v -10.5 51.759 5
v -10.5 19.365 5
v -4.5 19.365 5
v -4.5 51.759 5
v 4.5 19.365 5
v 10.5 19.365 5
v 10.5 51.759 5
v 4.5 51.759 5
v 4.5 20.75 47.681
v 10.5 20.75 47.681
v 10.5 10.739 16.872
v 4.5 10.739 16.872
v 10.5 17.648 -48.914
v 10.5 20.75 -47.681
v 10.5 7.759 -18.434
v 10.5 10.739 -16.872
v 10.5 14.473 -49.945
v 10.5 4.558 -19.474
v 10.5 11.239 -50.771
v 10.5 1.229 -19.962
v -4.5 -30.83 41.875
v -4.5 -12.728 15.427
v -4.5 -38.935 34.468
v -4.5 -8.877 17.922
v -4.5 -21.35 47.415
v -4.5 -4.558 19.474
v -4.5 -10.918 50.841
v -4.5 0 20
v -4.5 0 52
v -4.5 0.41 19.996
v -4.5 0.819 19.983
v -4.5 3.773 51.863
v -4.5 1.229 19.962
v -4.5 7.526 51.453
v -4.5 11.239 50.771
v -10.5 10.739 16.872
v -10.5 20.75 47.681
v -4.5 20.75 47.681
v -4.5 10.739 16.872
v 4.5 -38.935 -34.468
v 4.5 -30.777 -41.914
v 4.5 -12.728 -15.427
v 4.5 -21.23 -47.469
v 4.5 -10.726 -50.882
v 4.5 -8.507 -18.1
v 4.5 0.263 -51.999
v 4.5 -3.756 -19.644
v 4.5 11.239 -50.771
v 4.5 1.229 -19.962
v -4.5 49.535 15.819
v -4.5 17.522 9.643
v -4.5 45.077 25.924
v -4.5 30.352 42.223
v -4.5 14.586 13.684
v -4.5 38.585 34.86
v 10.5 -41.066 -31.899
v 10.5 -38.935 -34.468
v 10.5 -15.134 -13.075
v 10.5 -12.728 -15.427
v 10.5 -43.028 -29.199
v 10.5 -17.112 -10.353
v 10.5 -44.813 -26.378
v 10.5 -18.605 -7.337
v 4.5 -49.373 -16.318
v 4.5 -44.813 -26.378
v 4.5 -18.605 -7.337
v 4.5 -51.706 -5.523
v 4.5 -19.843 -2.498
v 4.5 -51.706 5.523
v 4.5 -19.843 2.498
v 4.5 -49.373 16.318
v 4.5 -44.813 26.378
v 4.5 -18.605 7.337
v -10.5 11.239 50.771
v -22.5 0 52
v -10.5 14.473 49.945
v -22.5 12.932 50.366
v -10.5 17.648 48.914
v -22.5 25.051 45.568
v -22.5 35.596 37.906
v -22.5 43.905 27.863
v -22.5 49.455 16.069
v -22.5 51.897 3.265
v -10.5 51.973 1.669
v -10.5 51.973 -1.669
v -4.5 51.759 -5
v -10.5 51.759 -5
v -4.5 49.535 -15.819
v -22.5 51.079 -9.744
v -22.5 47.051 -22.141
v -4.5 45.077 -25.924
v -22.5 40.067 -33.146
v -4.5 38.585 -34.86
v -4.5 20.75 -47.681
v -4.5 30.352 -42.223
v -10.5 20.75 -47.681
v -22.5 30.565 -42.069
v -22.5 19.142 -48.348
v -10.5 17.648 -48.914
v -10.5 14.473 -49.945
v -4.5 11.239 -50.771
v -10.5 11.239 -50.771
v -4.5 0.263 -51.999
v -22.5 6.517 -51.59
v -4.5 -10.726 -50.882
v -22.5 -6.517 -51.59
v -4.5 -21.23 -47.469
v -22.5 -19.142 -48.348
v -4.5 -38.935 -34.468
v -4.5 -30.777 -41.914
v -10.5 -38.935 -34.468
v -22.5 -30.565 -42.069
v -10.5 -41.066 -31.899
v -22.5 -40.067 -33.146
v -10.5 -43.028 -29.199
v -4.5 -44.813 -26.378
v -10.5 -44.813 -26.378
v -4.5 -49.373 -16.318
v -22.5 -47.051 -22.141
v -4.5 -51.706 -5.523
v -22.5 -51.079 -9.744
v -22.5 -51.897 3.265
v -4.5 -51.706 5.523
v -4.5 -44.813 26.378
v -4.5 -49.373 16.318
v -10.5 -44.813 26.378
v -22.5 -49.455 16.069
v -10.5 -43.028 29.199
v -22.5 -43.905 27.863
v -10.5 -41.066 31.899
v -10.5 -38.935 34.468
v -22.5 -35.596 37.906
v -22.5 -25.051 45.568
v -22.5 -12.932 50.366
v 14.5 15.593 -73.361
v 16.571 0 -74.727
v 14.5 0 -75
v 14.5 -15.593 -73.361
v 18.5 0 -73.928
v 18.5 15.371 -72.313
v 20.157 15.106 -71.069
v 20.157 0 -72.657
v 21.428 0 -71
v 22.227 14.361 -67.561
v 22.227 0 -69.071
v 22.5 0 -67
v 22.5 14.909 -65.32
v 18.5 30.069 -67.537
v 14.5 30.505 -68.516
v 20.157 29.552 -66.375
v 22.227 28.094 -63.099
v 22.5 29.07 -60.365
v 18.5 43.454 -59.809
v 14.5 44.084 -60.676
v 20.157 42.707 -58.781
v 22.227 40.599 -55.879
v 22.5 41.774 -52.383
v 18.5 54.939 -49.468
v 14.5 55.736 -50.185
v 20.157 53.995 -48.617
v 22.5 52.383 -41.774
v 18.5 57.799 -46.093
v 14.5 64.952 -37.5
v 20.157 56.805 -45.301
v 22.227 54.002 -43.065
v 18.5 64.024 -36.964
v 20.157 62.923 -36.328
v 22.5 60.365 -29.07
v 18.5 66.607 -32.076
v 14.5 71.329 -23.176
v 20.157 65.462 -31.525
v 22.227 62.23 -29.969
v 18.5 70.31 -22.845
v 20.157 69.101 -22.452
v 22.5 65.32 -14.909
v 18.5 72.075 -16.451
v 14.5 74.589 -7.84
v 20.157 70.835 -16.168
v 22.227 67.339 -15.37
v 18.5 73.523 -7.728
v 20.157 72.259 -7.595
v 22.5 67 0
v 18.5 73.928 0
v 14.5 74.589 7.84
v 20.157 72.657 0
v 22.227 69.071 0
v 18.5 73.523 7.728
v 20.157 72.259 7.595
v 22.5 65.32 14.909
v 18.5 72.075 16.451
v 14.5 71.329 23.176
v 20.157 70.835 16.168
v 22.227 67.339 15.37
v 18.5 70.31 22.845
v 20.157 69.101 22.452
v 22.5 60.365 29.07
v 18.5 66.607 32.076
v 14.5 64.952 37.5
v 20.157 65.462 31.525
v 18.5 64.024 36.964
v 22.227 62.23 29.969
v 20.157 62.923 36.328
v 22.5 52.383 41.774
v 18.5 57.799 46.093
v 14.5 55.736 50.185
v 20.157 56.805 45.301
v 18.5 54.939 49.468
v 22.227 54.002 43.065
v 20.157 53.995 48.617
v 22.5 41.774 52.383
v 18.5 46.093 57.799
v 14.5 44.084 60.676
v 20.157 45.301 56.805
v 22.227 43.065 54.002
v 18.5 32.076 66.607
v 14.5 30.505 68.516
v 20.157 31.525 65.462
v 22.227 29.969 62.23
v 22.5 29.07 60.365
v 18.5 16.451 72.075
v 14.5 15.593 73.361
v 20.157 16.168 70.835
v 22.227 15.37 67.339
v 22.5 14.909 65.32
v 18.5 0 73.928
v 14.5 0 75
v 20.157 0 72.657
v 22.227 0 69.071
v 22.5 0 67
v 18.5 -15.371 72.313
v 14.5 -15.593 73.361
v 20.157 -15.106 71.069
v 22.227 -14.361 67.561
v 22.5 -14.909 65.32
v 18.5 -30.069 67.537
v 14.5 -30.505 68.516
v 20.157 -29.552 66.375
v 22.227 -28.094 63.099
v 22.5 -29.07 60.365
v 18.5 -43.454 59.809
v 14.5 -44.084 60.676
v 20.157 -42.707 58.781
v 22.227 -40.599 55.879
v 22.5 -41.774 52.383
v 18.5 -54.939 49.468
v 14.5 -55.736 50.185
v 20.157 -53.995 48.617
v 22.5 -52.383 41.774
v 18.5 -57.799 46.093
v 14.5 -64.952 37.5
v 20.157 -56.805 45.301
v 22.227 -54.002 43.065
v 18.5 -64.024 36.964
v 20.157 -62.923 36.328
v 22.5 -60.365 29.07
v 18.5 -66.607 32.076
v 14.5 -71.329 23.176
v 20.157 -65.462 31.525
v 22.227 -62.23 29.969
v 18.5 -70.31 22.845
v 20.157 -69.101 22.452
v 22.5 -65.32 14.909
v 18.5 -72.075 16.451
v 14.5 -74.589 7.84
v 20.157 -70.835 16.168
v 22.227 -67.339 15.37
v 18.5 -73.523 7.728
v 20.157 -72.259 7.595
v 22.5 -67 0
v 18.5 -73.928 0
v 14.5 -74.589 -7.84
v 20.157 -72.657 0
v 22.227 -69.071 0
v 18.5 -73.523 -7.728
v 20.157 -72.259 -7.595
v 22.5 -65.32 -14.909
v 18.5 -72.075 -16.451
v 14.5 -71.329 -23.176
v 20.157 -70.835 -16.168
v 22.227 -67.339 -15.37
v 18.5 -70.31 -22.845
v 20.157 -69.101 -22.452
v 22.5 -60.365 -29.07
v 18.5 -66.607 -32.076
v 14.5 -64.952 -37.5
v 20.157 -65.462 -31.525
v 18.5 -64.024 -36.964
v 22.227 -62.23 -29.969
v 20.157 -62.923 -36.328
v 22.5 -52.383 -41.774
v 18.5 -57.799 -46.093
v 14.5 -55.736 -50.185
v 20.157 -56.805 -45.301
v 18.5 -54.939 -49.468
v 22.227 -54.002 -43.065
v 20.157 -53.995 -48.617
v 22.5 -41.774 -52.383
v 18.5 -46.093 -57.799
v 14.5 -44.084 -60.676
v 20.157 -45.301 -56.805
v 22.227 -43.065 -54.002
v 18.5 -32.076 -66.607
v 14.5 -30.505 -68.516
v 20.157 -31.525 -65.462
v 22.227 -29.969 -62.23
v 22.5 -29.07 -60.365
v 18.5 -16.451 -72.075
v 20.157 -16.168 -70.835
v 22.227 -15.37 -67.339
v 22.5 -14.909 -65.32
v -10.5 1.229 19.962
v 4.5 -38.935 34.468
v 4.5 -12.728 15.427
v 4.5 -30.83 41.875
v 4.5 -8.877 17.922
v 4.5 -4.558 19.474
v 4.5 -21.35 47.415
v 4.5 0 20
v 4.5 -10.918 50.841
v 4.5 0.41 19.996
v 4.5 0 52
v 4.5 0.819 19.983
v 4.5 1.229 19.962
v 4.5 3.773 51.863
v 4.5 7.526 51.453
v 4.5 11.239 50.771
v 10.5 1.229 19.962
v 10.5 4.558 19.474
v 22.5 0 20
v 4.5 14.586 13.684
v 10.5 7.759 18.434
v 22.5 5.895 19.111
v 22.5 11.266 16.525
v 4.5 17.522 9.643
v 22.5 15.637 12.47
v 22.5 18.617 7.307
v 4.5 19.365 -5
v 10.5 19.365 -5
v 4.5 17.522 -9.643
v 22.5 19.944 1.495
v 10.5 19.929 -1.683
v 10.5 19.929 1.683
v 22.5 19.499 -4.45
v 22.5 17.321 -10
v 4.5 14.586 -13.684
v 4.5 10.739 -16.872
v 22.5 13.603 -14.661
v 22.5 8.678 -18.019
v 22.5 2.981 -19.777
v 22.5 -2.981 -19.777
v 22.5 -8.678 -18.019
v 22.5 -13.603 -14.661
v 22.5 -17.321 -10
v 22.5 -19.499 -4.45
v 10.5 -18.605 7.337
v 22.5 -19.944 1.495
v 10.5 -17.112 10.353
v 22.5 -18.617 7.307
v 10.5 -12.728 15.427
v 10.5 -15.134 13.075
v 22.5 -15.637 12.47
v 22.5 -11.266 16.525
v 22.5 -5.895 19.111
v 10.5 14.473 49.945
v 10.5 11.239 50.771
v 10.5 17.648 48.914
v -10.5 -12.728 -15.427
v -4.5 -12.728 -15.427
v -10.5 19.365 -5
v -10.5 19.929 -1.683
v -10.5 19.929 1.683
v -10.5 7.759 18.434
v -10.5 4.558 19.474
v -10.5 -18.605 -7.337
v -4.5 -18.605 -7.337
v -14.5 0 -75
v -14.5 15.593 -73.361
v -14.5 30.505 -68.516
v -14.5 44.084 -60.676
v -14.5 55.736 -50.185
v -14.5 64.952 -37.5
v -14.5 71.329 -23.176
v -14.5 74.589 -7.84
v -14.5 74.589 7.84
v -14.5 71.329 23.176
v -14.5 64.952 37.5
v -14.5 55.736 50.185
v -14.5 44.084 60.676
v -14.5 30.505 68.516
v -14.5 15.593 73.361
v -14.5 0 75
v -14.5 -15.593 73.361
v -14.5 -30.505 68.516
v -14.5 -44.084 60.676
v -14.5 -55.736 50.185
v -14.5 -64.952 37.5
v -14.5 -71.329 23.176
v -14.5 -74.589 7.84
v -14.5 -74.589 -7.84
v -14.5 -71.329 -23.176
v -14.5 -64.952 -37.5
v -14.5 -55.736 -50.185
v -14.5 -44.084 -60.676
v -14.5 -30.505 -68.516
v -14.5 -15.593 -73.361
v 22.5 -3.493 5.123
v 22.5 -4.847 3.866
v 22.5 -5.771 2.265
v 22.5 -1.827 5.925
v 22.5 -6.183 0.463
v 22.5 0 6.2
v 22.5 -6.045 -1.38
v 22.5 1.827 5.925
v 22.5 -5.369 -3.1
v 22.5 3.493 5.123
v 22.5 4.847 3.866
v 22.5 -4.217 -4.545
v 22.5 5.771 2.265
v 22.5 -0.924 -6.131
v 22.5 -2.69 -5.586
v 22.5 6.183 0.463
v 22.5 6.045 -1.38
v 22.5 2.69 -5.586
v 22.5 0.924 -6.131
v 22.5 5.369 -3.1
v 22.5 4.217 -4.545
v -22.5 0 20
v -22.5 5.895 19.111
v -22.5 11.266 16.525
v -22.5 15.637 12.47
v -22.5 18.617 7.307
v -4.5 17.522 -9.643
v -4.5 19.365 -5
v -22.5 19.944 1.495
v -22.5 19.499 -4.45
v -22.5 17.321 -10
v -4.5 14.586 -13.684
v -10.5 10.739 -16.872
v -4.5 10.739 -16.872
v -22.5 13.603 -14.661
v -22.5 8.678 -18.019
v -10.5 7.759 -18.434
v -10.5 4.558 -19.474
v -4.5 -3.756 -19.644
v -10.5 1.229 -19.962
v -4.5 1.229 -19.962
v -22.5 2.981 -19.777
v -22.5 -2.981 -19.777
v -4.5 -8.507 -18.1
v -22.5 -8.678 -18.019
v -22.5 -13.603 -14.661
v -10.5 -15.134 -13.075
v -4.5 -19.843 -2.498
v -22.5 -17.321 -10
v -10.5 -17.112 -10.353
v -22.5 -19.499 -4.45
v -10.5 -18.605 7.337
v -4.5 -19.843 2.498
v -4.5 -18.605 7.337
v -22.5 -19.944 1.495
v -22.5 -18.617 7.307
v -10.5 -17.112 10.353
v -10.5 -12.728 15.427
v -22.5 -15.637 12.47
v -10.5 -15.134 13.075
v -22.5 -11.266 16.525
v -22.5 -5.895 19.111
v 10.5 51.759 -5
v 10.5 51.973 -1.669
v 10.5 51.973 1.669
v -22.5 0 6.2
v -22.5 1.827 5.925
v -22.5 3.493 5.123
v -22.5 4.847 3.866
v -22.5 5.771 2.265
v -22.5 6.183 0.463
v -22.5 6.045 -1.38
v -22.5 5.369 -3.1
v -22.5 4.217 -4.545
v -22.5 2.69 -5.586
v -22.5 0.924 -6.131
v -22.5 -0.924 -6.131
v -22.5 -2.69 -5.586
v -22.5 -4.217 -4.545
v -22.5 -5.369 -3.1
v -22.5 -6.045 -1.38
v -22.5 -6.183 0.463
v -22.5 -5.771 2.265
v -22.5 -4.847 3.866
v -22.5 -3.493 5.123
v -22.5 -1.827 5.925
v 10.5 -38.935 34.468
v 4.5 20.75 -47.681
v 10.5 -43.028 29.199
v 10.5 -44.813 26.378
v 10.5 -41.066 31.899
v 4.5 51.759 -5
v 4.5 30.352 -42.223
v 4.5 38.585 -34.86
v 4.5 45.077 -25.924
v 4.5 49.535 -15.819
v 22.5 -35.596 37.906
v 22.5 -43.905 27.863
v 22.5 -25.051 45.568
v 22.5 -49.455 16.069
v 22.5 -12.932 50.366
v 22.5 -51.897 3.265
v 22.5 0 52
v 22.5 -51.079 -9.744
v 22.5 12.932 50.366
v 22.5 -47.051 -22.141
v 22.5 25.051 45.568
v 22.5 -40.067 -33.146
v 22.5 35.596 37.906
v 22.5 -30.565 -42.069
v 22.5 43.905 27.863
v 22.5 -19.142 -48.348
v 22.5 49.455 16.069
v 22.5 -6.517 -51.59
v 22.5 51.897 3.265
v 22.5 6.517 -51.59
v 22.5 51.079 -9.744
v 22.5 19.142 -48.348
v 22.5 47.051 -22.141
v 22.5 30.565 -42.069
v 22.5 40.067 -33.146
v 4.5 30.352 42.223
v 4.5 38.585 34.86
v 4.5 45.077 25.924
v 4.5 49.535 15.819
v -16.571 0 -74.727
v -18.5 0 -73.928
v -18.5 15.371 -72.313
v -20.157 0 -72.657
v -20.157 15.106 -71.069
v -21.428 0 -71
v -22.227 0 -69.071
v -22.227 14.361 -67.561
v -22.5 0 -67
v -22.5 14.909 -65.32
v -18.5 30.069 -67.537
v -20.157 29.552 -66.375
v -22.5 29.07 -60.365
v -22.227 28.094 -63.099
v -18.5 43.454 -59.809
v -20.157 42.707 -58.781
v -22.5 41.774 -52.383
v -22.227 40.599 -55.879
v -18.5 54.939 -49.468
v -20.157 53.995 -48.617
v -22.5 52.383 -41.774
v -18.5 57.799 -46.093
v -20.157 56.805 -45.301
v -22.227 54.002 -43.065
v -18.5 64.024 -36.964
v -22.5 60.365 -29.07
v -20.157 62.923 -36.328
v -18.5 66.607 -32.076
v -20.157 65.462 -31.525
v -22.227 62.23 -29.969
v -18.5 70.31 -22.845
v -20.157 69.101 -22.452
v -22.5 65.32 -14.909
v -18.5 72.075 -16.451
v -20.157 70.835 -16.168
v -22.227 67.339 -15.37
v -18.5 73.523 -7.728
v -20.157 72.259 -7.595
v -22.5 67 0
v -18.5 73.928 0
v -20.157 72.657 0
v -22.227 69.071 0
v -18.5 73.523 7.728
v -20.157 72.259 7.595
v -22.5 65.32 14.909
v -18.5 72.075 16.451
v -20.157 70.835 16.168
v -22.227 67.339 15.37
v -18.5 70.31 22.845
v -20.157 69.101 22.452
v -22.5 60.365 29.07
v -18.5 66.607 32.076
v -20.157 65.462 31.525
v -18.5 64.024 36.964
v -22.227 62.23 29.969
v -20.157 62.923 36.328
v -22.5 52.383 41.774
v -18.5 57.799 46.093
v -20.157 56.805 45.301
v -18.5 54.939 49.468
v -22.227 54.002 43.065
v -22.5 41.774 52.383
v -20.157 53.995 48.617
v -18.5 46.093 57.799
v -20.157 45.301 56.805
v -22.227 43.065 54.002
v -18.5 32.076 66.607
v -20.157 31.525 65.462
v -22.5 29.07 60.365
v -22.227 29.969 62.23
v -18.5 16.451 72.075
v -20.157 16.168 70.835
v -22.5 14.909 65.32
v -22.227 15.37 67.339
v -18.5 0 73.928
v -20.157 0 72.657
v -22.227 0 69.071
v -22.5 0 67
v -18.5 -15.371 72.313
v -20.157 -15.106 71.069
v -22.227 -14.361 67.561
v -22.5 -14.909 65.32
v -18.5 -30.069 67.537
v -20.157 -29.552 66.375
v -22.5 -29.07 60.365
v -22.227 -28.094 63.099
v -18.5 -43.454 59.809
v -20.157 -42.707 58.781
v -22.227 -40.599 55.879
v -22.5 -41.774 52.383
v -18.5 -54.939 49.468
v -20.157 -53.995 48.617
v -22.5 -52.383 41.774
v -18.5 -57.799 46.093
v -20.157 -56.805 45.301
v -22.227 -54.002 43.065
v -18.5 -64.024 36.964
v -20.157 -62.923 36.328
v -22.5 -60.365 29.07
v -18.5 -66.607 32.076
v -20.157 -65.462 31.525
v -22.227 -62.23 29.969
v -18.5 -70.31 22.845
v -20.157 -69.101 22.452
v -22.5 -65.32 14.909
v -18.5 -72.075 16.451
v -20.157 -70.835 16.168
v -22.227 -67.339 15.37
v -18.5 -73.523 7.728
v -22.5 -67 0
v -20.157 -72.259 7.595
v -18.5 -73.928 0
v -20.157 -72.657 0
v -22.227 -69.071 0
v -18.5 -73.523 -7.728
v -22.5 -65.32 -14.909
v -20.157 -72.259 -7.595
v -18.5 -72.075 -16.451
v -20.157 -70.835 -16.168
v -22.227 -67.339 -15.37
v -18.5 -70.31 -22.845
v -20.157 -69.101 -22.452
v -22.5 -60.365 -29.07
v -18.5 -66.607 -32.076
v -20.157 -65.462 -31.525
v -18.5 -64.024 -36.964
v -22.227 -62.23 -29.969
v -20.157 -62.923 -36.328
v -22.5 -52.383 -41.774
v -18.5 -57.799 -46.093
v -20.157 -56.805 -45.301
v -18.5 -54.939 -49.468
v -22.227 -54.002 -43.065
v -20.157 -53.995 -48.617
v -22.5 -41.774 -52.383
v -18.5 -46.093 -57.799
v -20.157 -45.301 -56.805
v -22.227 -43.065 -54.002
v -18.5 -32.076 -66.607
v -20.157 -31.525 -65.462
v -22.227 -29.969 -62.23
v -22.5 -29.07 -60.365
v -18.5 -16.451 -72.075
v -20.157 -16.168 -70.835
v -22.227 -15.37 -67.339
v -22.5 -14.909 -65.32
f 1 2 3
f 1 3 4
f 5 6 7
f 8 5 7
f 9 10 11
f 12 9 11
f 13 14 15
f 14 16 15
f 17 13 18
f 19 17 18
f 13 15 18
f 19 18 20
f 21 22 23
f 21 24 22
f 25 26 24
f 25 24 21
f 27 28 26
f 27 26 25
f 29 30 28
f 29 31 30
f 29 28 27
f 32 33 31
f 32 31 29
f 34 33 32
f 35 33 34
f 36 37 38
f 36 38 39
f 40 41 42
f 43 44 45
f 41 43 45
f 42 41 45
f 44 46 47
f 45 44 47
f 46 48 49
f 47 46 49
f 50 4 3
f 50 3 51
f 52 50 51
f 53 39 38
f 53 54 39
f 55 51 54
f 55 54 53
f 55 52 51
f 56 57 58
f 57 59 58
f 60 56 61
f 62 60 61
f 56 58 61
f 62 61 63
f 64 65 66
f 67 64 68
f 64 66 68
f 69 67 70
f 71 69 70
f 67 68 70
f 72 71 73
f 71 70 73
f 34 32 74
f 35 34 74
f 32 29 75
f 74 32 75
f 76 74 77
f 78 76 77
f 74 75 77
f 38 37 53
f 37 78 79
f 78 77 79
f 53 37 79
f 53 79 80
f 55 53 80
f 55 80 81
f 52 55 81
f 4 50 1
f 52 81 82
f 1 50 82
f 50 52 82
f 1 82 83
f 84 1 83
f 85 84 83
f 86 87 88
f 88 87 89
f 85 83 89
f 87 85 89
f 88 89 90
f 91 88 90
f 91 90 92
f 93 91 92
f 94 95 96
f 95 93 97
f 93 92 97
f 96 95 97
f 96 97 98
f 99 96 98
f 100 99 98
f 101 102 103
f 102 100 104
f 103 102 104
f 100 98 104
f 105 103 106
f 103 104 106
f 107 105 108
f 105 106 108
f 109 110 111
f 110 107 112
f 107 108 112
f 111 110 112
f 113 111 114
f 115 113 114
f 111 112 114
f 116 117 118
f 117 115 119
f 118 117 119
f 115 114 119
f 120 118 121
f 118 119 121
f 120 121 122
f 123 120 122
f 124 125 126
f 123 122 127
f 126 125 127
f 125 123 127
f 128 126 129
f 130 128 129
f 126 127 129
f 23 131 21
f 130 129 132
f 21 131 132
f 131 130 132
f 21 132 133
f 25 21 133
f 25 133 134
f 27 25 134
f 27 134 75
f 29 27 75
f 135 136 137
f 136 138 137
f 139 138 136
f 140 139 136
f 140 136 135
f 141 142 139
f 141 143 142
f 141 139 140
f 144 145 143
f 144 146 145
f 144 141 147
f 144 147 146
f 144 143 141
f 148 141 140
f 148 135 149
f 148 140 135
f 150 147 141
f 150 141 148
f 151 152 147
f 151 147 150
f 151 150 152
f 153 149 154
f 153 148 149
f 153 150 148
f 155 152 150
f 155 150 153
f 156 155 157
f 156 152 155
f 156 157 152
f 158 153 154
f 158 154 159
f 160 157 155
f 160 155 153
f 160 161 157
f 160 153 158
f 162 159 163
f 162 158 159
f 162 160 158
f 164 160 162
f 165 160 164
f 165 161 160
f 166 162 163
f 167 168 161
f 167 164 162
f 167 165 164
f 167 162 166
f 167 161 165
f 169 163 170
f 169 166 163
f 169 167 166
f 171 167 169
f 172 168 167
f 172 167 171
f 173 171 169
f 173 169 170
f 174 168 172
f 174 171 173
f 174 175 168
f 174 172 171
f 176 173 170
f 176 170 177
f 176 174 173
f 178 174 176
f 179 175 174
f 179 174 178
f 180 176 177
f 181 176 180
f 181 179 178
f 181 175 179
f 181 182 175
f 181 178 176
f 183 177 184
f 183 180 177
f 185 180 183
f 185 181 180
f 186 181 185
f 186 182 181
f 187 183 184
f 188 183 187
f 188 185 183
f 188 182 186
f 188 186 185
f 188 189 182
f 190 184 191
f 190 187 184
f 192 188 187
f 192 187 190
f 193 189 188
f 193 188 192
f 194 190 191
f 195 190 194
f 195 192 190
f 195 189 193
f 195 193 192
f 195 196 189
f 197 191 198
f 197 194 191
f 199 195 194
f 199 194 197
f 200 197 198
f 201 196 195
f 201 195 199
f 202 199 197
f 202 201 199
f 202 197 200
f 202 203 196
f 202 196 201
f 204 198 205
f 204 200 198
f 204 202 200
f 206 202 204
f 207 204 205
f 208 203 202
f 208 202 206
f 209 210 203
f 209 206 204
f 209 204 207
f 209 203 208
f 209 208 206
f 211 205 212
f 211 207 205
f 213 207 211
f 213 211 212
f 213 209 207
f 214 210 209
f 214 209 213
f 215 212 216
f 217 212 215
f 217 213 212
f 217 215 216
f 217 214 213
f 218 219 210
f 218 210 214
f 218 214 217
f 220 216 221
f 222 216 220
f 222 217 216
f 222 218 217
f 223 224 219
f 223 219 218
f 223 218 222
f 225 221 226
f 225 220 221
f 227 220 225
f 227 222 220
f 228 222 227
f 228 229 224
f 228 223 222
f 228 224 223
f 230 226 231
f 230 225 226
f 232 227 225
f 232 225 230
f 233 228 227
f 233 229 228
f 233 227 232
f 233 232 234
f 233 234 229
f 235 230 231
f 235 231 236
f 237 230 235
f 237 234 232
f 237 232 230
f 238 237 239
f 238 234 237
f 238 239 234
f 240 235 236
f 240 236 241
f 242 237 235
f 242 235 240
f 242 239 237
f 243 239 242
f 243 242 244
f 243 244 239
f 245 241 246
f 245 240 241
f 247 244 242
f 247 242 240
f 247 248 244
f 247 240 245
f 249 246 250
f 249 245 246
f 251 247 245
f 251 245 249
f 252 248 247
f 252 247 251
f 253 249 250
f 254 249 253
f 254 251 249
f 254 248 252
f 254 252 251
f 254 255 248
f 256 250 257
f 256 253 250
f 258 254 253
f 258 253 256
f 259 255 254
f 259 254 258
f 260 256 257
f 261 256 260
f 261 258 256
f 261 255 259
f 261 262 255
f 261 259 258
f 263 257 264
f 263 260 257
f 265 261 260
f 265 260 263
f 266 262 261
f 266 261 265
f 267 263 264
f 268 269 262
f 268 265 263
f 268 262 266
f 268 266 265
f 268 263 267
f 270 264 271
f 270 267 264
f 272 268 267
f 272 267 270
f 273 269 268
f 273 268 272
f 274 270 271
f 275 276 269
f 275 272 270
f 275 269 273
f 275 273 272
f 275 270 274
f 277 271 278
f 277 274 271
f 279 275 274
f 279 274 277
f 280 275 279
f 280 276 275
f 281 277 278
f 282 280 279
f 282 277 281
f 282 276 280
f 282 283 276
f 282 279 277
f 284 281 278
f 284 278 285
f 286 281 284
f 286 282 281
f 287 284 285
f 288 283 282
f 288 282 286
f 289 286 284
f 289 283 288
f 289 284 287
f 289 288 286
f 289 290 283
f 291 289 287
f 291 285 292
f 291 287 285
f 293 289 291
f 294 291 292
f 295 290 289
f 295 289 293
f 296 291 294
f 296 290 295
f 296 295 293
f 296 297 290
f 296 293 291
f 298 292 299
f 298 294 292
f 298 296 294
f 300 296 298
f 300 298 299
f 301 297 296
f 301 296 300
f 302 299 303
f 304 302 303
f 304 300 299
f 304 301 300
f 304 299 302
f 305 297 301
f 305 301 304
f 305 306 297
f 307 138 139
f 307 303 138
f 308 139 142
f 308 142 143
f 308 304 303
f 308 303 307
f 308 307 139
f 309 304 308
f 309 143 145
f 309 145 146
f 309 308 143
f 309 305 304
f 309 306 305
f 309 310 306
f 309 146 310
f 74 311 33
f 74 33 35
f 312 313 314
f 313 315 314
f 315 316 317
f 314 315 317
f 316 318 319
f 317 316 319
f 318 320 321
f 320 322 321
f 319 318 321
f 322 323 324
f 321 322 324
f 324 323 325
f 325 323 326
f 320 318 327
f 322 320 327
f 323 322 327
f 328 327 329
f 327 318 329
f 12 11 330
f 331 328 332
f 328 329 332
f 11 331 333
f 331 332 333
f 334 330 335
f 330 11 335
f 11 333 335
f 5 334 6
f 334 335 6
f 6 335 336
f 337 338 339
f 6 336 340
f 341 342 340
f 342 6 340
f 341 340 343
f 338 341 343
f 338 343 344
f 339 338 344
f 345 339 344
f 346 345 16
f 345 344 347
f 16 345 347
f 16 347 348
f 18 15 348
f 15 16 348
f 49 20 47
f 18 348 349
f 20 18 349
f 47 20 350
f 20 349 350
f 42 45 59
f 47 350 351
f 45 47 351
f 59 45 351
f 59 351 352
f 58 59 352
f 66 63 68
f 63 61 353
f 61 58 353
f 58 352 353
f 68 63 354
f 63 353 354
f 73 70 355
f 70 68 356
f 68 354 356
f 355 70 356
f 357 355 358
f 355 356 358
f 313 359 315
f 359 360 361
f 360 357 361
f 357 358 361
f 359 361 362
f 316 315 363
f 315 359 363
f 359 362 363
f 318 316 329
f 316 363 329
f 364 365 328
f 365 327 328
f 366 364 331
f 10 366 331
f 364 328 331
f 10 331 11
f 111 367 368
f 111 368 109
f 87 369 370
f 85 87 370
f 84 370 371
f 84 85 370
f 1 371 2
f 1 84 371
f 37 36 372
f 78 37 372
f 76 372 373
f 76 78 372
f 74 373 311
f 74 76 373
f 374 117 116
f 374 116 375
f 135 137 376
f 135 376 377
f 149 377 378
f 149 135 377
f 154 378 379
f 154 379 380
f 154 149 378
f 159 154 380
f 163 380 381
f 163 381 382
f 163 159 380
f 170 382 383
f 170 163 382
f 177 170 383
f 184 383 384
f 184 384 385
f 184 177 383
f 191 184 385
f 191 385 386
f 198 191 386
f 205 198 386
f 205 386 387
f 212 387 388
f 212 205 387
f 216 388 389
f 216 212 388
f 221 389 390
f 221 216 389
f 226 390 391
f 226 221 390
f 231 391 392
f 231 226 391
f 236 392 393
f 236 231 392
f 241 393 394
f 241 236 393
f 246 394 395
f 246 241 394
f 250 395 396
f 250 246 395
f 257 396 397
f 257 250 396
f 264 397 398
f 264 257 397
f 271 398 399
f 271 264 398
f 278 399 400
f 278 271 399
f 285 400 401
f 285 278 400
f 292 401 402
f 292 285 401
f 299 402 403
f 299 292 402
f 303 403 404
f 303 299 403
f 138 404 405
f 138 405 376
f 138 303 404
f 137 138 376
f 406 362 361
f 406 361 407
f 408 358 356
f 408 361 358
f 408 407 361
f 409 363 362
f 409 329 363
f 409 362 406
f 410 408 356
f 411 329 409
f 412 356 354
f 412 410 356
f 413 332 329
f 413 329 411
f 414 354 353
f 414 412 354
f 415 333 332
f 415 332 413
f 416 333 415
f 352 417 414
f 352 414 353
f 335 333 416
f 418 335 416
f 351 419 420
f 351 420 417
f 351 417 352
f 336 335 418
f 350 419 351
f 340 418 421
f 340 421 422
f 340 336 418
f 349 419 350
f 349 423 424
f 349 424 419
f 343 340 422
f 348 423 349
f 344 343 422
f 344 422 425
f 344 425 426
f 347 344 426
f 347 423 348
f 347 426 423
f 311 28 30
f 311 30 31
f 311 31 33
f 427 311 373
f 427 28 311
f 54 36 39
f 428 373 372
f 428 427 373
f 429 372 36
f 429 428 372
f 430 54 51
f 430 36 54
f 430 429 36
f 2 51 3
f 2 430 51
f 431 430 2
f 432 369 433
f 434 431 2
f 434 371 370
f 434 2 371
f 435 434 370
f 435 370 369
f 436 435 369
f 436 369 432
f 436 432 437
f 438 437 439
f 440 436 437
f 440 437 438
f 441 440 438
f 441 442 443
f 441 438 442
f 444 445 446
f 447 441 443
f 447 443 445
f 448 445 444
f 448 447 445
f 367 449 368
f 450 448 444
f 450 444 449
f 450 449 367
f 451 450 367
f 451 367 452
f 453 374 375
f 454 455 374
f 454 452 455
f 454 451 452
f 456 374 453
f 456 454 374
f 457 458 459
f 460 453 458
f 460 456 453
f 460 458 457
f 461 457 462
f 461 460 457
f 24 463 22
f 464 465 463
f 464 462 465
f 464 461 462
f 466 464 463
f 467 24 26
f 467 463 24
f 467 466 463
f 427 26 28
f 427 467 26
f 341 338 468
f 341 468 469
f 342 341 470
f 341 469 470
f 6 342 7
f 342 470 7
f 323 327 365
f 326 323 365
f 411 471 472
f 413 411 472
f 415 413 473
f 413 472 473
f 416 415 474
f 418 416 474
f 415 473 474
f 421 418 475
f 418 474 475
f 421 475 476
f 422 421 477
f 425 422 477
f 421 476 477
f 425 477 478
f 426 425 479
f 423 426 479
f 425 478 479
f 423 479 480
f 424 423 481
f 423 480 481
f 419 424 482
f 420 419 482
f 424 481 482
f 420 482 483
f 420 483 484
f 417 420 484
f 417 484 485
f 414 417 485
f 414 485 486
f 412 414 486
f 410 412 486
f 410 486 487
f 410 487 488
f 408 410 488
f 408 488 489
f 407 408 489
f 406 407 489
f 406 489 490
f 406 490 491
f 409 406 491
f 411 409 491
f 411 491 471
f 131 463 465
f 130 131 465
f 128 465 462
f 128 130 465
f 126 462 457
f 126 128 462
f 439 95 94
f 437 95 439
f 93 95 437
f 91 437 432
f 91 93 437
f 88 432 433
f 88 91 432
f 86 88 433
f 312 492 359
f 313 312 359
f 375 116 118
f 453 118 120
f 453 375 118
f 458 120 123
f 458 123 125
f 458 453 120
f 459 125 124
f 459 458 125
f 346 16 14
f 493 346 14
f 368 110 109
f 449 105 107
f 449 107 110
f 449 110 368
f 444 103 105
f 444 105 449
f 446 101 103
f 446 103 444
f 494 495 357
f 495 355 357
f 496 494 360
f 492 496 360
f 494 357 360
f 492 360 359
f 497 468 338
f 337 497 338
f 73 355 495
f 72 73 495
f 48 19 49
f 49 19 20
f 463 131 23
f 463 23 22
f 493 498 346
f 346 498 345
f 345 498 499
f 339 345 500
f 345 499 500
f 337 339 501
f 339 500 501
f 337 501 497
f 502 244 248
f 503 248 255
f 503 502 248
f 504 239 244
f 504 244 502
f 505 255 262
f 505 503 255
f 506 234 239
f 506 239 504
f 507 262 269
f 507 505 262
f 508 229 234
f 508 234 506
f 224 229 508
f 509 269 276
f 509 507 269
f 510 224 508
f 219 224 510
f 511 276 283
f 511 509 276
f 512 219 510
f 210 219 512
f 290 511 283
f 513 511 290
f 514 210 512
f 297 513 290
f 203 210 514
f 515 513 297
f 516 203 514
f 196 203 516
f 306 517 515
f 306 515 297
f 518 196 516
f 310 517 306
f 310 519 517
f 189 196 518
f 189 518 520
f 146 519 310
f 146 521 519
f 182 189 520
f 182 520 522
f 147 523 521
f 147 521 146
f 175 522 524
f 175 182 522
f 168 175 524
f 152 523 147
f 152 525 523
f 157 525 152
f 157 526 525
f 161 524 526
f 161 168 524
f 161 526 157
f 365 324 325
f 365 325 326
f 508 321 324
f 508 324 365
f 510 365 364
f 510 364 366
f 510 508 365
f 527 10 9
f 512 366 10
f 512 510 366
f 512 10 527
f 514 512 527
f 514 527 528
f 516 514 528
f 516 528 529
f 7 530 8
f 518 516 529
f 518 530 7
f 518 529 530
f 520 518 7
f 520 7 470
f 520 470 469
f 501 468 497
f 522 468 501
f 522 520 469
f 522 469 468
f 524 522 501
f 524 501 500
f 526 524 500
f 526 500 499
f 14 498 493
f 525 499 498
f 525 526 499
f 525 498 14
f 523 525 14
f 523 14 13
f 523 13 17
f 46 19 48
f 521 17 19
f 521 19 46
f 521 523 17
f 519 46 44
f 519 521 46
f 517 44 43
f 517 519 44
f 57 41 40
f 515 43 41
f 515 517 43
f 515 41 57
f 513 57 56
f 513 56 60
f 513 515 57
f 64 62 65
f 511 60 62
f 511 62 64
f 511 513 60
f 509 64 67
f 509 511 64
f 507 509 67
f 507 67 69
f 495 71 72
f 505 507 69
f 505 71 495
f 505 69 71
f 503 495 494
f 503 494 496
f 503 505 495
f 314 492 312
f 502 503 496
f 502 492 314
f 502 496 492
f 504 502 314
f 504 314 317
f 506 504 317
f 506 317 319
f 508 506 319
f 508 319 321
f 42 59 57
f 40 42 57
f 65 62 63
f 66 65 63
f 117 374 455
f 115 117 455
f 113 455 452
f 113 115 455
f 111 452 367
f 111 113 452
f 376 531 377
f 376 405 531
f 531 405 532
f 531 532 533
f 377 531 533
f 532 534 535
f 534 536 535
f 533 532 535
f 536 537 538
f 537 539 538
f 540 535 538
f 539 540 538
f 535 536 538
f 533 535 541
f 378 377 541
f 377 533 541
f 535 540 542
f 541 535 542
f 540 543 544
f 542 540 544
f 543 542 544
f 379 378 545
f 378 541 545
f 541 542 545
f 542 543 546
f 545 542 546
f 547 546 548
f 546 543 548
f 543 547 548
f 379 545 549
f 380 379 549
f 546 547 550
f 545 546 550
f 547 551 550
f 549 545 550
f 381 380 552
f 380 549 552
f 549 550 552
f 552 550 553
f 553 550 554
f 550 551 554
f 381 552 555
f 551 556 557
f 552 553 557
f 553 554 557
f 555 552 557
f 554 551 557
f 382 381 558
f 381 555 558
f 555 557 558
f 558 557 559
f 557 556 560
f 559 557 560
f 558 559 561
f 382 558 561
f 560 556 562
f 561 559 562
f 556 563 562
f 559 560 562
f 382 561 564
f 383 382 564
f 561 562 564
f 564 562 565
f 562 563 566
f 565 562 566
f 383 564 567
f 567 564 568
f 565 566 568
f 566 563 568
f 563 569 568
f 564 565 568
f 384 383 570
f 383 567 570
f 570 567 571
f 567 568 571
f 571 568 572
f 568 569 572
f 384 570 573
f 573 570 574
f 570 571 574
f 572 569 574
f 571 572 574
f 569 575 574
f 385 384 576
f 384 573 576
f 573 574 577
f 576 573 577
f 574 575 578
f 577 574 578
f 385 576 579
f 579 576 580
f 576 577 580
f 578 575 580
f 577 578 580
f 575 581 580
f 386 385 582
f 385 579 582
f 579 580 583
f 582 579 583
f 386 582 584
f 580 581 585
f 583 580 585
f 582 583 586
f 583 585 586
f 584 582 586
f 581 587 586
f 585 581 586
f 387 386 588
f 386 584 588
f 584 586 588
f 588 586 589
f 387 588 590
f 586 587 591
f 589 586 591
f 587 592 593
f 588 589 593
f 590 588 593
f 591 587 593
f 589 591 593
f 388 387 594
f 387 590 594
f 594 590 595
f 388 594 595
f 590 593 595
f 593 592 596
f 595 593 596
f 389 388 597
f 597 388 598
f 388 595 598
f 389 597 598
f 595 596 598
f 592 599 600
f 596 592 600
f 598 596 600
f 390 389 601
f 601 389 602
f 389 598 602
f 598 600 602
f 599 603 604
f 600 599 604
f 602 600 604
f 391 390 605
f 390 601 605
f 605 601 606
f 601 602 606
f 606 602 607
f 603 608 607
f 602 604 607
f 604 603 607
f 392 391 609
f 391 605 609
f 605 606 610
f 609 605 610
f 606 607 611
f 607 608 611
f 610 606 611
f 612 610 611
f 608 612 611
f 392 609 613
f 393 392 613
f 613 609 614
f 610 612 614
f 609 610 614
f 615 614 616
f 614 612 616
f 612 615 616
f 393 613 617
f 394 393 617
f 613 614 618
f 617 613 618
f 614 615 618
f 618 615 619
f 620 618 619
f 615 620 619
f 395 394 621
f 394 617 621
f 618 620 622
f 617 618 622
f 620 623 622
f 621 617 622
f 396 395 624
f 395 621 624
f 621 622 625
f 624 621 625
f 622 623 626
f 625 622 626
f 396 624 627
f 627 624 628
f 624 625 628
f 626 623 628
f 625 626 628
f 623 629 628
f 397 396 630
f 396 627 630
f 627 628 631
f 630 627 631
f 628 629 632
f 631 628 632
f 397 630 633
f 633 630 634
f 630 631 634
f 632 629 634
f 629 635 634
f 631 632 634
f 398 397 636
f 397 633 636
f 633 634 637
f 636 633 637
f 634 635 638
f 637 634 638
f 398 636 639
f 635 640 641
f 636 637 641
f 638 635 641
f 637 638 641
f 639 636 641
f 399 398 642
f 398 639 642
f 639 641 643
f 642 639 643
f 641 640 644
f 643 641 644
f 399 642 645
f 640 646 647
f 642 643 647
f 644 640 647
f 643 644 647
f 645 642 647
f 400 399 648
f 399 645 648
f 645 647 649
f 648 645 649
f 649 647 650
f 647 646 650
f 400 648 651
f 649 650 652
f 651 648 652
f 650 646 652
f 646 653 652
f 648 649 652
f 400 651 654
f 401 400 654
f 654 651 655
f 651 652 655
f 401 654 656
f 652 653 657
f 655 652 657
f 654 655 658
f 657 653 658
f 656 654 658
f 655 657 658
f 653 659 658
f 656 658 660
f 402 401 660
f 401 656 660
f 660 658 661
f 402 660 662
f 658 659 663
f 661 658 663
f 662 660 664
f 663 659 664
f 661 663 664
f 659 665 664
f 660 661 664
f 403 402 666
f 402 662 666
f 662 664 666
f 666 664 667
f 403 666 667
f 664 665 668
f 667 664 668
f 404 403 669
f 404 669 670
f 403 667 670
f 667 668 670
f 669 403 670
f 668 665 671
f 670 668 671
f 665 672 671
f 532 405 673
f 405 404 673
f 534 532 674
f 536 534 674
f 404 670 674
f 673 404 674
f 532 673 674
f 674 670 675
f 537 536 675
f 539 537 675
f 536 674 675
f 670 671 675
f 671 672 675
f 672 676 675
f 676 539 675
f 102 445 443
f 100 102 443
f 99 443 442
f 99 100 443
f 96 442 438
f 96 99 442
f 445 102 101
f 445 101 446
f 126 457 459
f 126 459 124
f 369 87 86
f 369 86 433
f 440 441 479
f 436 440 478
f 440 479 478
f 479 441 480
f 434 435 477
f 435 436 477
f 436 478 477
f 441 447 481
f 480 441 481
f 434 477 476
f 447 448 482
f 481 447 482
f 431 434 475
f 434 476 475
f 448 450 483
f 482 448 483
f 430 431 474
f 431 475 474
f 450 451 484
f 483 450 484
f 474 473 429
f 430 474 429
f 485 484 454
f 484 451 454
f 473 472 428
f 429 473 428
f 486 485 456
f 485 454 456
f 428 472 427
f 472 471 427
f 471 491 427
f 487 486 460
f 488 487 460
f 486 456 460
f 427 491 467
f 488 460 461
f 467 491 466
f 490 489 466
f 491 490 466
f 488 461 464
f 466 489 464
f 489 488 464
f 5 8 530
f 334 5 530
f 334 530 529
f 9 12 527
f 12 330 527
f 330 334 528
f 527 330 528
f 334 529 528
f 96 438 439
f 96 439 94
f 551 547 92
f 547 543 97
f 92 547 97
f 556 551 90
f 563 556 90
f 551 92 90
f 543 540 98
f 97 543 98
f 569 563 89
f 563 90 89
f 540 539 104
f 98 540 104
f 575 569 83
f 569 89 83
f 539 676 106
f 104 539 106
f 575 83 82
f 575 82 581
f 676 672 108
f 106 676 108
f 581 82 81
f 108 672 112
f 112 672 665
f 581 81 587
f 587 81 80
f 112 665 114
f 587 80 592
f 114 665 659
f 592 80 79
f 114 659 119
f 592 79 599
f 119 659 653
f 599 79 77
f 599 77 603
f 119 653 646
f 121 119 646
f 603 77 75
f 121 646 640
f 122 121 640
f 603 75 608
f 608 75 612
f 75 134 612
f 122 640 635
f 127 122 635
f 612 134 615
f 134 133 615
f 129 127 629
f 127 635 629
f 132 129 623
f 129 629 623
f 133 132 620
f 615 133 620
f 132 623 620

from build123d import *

# Parameters (mm, degrees)
SKETCH_1_R               = 60
EXTRUDE_1_DEPTH          = 22.5
SKETCH_2_R               = 75
SKETCH_2_R_2             = 60
EXTRUDE_2_DEPTH          = 45
FILLET_1_R               = 8
SKETCH_3_R               = 52
SKETCH_3_R_2             = 20
CUT_EXTRUDE_1_DEPTH      = 18
SKETCH_4_R               = 6.2
CUT_EXTRUDE_2_DEPTH      = 116.217186348
EXTRUDE_START            = 6
EXTRUDE_3_DEPTH          = 6
PATTERN_CIRCULAR_1_COUNT = 5
MIRROR_START             = 6
MIRROR_2_COPY_1_DEPTH    = 6
MIRROR_2_COPY_2_DEPTH    = 6
MIRROR_2_COPY_3_DEPTH    = 6
MIRROR_2_COPY_4_DEPTH    = 6


with BuildPart() as part:
    # 草图1 → 凸台-拉伸1 (new, symmetric)
    with BuildSketch(Plane(origin=(0, 0, 0), x_dir=(0, 0, -1), z_dir=(1, 0, 0))):
        with Locations(Location((0, 0, 0), (0, 0, 180))):
            Circle(SKETCH_1_R)
    extrude(amount=EXTRUDE_1_DEPTH, both=True)

    # 草图3 → 切除-拉伸1 (cut)
    with BuildSketch(Plane.ZY.offset(22.5)):
        Circle(SKETCH_3_R)
        Circle(SKETCH_3_R_2, mode=Mode.SUBTRACT)
    cut_extrude_1 = extrude(amount=-CUT_EXTRUDE_1_DEPTH, mode=Mode.SUBTRACT)

    # 草图4 → 切除-拉伸2 (cut, through all)
    with BuildSketch(Plane.ZY.offset(22.5)):
        Circle(SKETCH_4_R)
    extrude(amount=-CUT_EXTRUDE_2_DEPTH, mode=Mode.SUBTRACT)


with BuildPart() as body_2:
    # 草图2 → 凸台-拉伸2 (new body)
    with BuildSketch(Plane(origin=(22.5, 0, 0), x_dir=(0, 0, -1), z_dir=(1, 0, 0))):
        Circle(SKETCH_2_R)
        Circle(SKETCH_2_R_2, mode=Mode.SUBTRACT)
    extrude(amount=-EXTRUDE_2_DEPTH)

    # 圆角1
    fillet_1_edges = [body_2.edges().sort_by_distance(p)[0] for p in [
        (22.5, 0, 75),
        (-22.5, 0, 75),
    ]]
    fillet(fillet_1_edges, radius=FILLET_1_R)


    add(part.part)  # 凸台-拉伸3 merges part
    # 草图5 → 凸台-拉伸3 (add)
    with BuildSketch(Plane.ZY.offset(4.5).offset(EXTRUDE_START)):
        with BuildLine():
            ThreePointArc((5, 51.759057178), (0, 52), (-5, 51.759057178))
            Line((-5, 51.759057178), (-5, 19.364916731))
            ThreePointArc((-5, 19.364916731), (0, 20), (5, 19.364916731))
            Line((5, 19.364916731), (5, 51.759057178))
        make_face()
    extrude_3 = extrude(amount=-EXTRUDE_3_DEPTH)

    # 阵列(圆周)1: 凸台-拉伸3 ×5 about axis
    pattern_circular_1_axis = Axis((0, 0, 0), (1, 0, 0))
    for i in range(1, PATTERN_CIRCULAR_1_COUNT):
        add(extrude_3.rotate(pattern_circular_1_axis, i * 360 / PATTERN_CIRCULAR_1_COUNT))

    # 镜向2: 切除-拉伸1, 凸台-拉伸3 across plane
    add(cut_extrude_1.mirror(Plane(origin=(0, 0, 0), x_dir=(0, 0, 1), z_dir=(1, 0, 0))), mode=Mode.SUBTRACT)
    add(extrude_3.mirror(Plane(origin=(0, 0, 0), x_dir=(0, 0, 1), z_dir=(1, 0, 0))))

    # 镜向2 copy 1 sketch → 镜向2 copy 1 (add)
    with BuildSketch(Plane(origin=(4.5, 0, 0), x_dir=(0, -0.9510565162951535, 0.30901699437494745), z_dir=(1, 0, 0)).offset(MIRROR_START)):
        with BuildLine():
            ThreePointArc((5, -51.759057178), (0, -52), (-5, -51.759057178))
            Line((-5, -51.759057178), (-5, -19.364916731))
            ThreePointArc((-5, -19.364916731), (0, -20), (5, -19.364916731))
            Line((5, -19.364916731), (5, -51.759057178))
        make_face()
    extrude(amount=-MIRROR_2_COPY_1_DEPTH)

    # 镜向2 copy 2 sketch → 镜向2 copy 2 (add)
    with BuildSketch(Plane(origin=(4.5, 0, 0), x_dir=(0, -0.5877852522924732, -0.8090169943749473), z_dir=(1, 0, 0)).offset(MIRROR_START)):
        with BuildLine():
            ThreePointArc((5, -51.759057178), (0, -52), (-5, -51.759057178))
            Line((-5, -51.759057178), (-5, -19.364916731))
            ThreePointArc((-5, -19.364916731), (0, -20), (5, -19.364916731))
            Line((5, -19.364916731), (5, -51.759057178))
        make_face()
    extrude(amount=-MIRROR_2_COPY_2_DEPTH)

    # 镜向2 copy 3 sketch → 镜向2 copy 3 (add)
    with BuildSketch(Plane(origin=(4.5, 0, 0), x_dir=(0, 0.587785252292473, -0.8090169943749476), z_dir=(1, 0, 0)).offset(MIRROR_START)):
        with BuildLine():
            ThreePointArc((5, -51.759057178), (0, -52), (-5, -51.759057178))
            Line((-5, -51.759057178), (-5, -19.364916731))
            ThreePointArc((-5, -19.364916731), (0, -20), (5, -19.364916731))
            Line((5, -19.364916731), (5, -51.759057178))
        make_face()
    extrude(amount=-MIRROR_2_COPY_3_DEPTH)

    # 镜向2 copy 4 sketch → 镜向2 copy 4 (add)
    with BuildSketch(Plane(origin=(4.5, 0, 0), x_dir=(0, 0.9510565162951536, 0.30901699437494723), z_dir=(1, 0, 0)).offset(MIRROR_START)):
        with BuildLine():
            ThreePointArc((5, -51.759057178), (0, -52), (-5, -51.759057178))
            Line((-5, -51.759057178), (-5, -19.364916731))
            ThreePointArc((-5, -19.364916731), (0, -20), (5, -19.364916731))
            Line((5, -19.364916731), (5, -51.759057178))
        make_face()
    extrude(amount=-MIRROR_2_COPY_4_DEPTH)


solid = body_2.part
